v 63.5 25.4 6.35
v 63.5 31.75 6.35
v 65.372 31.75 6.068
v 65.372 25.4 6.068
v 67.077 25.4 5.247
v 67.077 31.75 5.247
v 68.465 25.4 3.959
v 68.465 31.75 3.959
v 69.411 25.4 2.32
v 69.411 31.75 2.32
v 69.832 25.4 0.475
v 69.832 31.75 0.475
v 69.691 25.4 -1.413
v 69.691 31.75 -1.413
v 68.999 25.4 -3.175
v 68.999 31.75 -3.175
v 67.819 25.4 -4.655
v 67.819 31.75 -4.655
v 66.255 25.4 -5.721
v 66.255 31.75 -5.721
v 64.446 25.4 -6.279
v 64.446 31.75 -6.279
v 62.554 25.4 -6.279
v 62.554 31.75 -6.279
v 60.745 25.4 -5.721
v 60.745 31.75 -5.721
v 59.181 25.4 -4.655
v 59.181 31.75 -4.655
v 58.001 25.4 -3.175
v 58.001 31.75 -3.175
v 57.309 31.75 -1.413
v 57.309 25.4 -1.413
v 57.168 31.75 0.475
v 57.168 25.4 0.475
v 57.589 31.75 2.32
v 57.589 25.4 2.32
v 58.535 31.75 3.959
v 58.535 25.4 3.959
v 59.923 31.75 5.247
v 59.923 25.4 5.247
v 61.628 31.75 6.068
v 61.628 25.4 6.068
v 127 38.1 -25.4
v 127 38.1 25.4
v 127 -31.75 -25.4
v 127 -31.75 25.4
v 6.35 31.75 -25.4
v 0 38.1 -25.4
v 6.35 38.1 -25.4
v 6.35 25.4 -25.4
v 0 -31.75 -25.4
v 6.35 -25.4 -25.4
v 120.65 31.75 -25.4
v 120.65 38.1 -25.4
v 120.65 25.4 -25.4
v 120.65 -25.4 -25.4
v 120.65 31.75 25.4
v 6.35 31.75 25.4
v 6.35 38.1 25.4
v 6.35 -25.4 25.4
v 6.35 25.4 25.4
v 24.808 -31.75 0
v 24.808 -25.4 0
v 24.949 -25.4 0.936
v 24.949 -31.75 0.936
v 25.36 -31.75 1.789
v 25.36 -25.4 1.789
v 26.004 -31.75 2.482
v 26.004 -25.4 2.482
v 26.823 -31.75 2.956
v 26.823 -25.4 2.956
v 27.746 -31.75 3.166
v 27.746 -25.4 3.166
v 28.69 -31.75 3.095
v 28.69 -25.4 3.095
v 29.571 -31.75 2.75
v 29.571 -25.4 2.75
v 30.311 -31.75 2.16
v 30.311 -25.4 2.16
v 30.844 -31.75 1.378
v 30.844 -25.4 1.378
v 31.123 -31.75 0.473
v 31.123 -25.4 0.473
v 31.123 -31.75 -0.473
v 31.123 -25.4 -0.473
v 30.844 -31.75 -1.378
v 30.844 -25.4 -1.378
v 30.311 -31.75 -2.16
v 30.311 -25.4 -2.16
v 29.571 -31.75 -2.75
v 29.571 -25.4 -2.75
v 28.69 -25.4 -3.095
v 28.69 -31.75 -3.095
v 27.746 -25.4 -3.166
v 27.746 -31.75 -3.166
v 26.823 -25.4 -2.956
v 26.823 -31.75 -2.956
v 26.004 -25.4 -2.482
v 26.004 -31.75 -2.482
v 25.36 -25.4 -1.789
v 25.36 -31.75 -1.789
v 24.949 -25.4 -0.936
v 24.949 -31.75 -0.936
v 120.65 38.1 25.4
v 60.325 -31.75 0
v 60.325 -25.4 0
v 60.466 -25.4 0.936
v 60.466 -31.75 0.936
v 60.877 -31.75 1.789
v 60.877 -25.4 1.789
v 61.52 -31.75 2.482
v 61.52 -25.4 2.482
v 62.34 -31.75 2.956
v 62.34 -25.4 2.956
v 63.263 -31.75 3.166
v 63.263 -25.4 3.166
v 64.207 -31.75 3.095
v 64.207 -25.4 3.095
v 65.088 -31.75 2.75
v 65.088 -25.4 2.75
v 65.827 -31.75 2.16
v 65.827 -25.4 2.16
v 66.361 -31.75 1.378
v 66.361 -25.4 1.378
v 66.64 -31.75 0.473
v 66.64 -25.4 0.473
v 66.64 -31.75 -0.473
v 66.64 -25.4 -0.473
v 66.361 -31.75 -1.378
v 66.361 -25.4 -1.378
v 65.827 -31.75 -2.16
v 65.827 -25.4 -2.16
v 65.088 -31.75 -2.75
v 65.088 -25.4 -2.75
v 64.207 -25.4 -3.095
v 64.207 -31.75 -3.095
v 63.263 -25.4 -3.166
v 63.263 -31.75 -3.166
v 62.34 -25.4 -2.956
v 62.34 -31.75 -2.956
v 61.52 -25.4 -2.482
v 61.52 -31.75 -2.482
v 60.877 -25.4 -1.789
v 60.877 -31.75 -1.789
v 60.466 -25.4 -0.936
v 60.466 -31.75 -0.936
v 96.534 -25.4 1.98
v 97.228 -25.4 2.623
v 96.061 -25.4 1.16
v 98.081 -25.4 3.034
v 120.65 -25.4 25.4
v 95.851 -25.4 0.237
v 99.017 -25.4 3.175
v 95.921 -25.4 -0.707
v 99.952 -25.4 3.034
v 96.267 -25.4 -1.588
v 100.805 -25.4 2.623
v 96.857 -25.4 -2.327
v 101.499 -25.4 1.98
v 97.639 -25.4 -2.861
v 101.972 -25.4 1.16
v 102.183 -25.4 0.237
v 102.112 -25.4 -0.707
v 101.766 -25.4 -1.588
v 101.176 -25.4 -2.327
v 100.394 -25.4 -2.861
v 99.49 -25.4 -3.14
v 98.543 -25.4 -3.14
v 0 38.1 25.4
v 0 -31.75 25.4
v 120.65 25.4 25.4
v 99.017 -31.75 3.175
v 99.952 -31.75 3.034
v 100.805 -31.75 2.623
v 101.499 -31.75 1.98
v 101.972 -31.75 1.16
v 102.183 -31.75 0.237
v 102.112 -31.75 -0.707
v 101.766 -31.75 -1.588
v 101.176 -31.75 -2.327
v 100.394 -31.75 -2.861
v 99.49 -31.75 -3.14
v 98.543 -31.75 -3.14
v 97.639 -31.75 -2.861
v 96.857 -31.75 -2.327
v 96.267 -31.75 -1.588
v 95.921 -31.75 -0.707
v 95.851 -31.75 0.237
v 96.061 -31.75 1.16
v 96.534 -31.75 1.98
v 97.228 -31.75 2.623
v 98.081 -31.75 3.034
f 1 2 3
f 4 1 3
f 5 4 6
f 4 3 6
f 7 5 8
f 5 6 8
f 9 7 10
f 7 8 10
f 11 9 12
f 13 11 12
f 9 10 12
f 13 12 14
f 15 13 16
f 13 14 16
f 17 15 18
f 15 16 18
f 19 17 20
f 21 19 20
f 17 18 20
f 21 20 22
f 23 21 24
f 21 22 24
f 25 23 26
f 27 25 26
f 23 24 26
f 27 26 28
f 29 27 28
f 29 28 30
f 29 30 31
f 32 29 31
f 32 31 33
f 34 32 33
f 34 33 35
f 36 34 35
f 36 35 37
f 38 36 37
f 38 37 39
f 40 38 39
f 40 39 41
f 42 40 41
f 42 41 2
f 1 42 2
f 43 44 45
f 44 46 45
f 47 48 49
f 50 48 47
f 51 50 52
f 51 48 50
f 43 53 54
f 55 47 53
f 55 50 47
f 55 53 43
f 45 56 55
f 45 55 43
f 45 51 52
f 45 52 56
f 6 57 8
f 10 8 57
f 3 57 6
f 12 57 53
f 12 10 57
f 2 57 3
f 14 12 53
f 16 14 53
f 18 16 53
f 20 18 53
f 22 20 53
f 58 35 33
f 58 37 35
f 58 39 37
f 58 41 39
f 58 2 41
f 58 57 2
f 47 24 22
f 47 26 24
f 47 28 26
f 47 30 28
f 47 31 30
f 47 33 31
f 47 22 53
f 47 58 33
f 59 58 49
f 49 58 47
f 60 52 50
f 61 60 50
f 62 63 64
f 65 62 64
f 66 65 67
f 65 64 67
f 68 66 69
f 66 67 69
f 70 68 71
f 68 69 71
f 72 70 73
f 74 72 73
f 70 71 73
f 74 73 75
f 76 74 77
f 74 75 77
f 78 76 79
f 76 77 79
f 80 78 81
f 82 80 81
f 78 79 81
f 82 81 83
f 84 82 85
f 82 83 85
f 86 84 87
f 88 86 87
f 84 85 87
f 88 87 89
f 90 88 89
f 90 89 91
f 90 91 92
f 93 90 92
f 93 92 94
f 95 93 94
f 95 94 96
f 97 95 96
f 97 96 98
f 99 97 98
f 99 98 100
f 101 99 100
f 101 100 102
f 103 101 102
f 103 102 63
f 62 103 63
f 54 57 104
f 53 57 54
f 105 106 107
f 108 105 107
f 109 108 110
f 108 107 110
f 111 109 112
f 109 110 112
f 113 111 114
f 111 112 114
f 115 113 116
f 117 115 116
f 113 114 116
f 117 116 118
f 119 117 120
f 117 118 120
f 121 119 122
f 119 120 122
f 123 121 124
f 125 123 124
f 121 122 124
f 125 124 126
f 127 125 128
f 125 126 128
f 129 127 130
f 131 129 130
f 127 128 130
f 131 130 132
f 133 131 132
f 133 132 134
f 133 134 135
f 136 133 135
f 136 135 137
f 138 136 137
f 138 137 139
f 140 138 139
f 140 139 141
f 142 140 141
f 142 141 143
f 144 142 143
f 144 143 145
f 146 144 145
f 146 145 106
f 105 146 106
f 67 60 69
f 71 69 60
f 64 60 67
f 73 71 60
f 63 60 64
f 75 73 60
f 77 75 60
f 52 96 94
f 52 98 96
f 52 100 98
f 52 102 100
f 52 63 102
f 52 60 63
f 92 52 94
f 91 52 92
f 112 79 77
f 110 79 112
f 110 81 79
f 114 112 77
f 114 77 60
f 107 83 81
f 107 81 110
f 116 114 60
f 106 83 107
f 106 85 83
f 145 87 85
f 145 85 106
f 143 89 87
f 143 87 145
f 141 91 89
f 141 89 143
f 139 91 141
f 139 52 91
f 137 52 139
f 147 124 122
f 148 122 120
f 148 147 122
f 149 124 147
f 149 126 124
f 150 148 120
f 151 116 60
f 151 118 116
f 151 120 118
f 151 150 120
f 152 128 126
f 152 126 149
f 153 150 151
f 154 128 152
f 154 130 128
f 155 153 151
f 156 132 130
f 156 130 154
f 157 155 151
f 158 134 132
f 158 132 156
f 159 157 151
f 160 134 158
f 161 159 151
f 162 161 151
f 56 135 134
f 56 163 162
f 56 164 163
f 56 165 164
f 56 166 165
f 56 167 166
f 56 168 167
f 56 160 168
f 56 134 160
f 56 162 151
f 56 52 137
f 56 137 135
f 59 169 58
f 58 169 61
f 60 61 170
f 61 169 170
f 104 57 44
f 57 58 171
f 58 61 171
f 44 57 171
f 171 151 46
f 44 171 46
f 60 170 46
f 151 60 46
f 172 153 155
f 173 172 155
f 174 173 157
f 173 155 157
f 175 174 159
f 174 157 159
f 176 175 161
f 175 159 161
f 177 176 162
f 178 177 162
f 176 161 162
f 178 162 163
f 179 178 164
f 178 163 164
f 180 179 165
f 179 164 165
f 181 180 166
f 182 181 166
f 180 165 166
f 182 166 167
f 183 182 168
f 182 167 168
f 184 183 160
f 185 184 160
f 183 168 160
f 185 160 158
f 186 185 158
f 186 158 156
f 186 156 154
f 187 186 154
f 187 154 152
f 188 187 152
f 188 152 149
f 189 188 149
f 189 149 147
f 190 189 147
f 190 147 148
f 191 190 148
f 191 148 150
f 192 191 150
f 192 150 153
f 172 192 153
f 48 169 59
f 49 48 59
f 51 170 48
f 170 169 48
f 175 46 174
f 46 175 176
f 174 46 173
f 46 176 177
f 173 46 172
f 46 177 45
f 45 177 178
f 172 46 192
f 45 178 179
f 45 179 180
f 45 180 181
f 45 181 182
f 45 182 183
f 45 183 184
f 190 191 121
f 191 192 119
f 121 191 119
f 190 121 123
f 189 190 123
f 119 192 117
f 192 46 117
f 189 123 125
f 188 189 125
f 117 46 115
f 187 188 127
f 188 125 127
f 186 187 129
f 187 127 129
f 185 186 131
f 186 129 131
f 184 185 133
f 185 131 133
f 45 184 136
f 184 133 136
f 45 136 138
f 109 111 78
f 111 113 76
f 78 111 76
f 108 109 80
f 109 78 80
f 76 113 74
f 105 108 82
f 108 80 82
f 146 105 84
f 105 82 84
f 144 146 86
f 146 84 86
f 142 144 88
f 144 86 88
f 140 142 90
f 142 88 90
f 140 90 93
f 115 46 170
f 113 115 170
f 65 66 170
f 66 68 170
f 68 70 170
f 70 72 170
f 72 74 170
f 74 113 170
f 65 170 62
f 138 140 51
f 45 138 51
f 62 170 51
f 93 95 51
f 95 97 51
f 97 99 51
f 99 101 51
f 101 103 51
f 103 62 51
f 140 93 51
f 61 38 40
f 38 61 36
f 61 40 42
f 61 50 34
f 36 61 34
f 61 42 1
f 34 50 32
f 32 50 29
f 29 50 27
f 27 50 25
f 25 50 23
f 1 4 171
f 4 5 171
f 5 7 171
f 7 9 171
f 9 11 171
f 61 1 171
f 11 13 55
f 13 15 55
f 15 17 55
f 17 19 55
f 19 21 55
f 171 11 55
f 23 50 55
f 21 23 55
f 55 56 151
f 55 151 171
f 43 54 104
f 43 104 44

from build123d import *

# Parameters (mm, degrees)
SKETCH1_W               = 50.8
SKETCH1_H               = 63.5
BOSS_EXTRUDE1_DEPTH     = 127
SKETCH2_W               = 6.35
SKETCH2_H               = 50.8
BOSS_EXTRUDE2_DEPTH     = 6.35
CUT_EXTRUDE2_DEPTH      = 136.002851822
CUT_EXTRUDE2_DEPTH_BACK = 136.002851822
SKETCH4_W               = 114.3
SKETCH4_H               = 50.8
CUT_EXTRUDE3_REACH      = 146.244
SKETCH5_R               = 6.35
CUT_EXTRUDE4_REACH      = 146.244
SKETCH6_R               = 3.175


with BuildPart() as part:
    # Sketch1 → Boss-Extrude1 (new body)
    with BuildSketch(Plane(origin=(0, 0, 0), x_dir=(0, 0, -1), z_dir=(1, 0, 0))):
        Rectangle(SKETCH1_W, SKETCH1_H)
    extrude(amount=BOSS_EXTRUDE1_DEPTH)

    # Sketch2 → Boss-Extrude2 (add)
    with BuildSketch(Plane(origin=(0, 31.75, 0), x_dir=(1, 0, 0), z_dir=(0, 1, 0))):
        with Locations((123.825, 0)):
            Rectangle(SKETCH2_W, SKETCH2_H)
        with Locations((3.175, 0)):
            Rectangle(SKETCH2_W, SKETCH2_H)
    extrude(amount=BOSS_EXTRUDE2_DEPTH)

    # Sketch4 → Cut-Extrude2 (cut, two sides: drawn at the far end of the back side and taken through both)
    with BuildSketch(Plane.XY.offset(-CUT_EXTRUDE2_DEPTH_BACK)):
        with Locations((63.5, 0)):
            Rectangle(SKETCH4_W, SKETCH4_H)
    extrude(amount=CUT_EXTRUDE2_DEPTH + CUT_EXTRUDE2_DEPTH_BACK, mode=Mode.SUBTRACT)

    # Sketch5 → Cut-Extrude3 (cut, up to next)
    with BuildSketch(Plane(origin=(0, 31.75, 0), x_dir=(1, 0, 0), z_dir=(0, 1, 0)), mode=Mode.PRIVATE) as cut_extrude3_sk1:
        with Locations(Location((63.5, 0, 0), (0, 0, 270))):
            Circle(SKETCH5_R)
    cut_extrude3_tool1 = extrude(cut_extrude3_sk1.sketch, amount=-CUT_EXTRUDE3_REACH, mode=Mode.PRIVATE) & part.part
    add(cut_extrude3_tool1.solids().sort_by_distance((63.5, 31.75, 0))[0], mode=Mode.SUBTRACT)

    # Sketch6 → Cut-Extrude4 (cut, up to next)
    with BuildSketch(Plane(origin=(0, -25.4, 0), x_dir=(1, 0, 0), z_dir=(0, 1, 0)), mode=Mode.PRIVATE) as cut_extrude4_sk1:
        with Locations(Location((63.5, 0, 0), (0, 0, 180))):
            Circle(SKETCH6_R)
    cut_extrude4_tool1 = extrude(cut_extrude4_sk1.sketch, amount=-CUT_EXTRUDE4_REACH, mode=Mode.PRIVATE) & part.part
    # Sketch6 → Cut-Extrude4 (cut, up to next)
    with BuildSketch(Plane(origin=(0, -25.4, 0), x_dir=(1, 0, 0), z_dir=(0, 1, 0)), mode=Mode.PRIVATE) as cut_extrude4_sk2:
        with Locations(Location((27.983351472, 0, 0), (0, 0, 180))):
            Circle(SKETCH6_R)
    cut_extrude4_tool2 = extrude(cut_extrude4_sk2.sketch, amount=-CUT_EXTRUDE4_REACH, mode=Mode.PRIVATE) & part.part
    # Sketch6 → Cut-Extrude4 (cut, up to next)
    with BuildSketch(Plane(origin=(0, -25.4, 0), x_dir=(1, 0, 0), z_dir=(0, 1, 0)), mode=Mode.PRIVATE) as cut_extrude4_sk3:
        with Locations(Location((99.016648528, 0, 0), (0, 0, 270))):
            Circle(SKETCH6_R)
    cut_extrude4_tool3 = extrude(cut_extrude4_sk3.sketch, amount=-CUT_EXTRUDE4_REACH, mode=Mode.PRIVATE) & part.part
    add(cut_extrude4_tool1.solids().sort_by_distance((63.5, -25.4, 0))[0], mode=Mode.SUBTRACT)
    add(cut_extrude4_tool2.solids().sort_by_distance((27.983351, -25.4, 0))[0], mode=Mode.SUBTRACT)
    add(cut_extrude4_tool3.solids().sort_by_distance((99.016649, -25.4, 0))[0], mode=Mode.SUBTRACT)


solid = part.part
